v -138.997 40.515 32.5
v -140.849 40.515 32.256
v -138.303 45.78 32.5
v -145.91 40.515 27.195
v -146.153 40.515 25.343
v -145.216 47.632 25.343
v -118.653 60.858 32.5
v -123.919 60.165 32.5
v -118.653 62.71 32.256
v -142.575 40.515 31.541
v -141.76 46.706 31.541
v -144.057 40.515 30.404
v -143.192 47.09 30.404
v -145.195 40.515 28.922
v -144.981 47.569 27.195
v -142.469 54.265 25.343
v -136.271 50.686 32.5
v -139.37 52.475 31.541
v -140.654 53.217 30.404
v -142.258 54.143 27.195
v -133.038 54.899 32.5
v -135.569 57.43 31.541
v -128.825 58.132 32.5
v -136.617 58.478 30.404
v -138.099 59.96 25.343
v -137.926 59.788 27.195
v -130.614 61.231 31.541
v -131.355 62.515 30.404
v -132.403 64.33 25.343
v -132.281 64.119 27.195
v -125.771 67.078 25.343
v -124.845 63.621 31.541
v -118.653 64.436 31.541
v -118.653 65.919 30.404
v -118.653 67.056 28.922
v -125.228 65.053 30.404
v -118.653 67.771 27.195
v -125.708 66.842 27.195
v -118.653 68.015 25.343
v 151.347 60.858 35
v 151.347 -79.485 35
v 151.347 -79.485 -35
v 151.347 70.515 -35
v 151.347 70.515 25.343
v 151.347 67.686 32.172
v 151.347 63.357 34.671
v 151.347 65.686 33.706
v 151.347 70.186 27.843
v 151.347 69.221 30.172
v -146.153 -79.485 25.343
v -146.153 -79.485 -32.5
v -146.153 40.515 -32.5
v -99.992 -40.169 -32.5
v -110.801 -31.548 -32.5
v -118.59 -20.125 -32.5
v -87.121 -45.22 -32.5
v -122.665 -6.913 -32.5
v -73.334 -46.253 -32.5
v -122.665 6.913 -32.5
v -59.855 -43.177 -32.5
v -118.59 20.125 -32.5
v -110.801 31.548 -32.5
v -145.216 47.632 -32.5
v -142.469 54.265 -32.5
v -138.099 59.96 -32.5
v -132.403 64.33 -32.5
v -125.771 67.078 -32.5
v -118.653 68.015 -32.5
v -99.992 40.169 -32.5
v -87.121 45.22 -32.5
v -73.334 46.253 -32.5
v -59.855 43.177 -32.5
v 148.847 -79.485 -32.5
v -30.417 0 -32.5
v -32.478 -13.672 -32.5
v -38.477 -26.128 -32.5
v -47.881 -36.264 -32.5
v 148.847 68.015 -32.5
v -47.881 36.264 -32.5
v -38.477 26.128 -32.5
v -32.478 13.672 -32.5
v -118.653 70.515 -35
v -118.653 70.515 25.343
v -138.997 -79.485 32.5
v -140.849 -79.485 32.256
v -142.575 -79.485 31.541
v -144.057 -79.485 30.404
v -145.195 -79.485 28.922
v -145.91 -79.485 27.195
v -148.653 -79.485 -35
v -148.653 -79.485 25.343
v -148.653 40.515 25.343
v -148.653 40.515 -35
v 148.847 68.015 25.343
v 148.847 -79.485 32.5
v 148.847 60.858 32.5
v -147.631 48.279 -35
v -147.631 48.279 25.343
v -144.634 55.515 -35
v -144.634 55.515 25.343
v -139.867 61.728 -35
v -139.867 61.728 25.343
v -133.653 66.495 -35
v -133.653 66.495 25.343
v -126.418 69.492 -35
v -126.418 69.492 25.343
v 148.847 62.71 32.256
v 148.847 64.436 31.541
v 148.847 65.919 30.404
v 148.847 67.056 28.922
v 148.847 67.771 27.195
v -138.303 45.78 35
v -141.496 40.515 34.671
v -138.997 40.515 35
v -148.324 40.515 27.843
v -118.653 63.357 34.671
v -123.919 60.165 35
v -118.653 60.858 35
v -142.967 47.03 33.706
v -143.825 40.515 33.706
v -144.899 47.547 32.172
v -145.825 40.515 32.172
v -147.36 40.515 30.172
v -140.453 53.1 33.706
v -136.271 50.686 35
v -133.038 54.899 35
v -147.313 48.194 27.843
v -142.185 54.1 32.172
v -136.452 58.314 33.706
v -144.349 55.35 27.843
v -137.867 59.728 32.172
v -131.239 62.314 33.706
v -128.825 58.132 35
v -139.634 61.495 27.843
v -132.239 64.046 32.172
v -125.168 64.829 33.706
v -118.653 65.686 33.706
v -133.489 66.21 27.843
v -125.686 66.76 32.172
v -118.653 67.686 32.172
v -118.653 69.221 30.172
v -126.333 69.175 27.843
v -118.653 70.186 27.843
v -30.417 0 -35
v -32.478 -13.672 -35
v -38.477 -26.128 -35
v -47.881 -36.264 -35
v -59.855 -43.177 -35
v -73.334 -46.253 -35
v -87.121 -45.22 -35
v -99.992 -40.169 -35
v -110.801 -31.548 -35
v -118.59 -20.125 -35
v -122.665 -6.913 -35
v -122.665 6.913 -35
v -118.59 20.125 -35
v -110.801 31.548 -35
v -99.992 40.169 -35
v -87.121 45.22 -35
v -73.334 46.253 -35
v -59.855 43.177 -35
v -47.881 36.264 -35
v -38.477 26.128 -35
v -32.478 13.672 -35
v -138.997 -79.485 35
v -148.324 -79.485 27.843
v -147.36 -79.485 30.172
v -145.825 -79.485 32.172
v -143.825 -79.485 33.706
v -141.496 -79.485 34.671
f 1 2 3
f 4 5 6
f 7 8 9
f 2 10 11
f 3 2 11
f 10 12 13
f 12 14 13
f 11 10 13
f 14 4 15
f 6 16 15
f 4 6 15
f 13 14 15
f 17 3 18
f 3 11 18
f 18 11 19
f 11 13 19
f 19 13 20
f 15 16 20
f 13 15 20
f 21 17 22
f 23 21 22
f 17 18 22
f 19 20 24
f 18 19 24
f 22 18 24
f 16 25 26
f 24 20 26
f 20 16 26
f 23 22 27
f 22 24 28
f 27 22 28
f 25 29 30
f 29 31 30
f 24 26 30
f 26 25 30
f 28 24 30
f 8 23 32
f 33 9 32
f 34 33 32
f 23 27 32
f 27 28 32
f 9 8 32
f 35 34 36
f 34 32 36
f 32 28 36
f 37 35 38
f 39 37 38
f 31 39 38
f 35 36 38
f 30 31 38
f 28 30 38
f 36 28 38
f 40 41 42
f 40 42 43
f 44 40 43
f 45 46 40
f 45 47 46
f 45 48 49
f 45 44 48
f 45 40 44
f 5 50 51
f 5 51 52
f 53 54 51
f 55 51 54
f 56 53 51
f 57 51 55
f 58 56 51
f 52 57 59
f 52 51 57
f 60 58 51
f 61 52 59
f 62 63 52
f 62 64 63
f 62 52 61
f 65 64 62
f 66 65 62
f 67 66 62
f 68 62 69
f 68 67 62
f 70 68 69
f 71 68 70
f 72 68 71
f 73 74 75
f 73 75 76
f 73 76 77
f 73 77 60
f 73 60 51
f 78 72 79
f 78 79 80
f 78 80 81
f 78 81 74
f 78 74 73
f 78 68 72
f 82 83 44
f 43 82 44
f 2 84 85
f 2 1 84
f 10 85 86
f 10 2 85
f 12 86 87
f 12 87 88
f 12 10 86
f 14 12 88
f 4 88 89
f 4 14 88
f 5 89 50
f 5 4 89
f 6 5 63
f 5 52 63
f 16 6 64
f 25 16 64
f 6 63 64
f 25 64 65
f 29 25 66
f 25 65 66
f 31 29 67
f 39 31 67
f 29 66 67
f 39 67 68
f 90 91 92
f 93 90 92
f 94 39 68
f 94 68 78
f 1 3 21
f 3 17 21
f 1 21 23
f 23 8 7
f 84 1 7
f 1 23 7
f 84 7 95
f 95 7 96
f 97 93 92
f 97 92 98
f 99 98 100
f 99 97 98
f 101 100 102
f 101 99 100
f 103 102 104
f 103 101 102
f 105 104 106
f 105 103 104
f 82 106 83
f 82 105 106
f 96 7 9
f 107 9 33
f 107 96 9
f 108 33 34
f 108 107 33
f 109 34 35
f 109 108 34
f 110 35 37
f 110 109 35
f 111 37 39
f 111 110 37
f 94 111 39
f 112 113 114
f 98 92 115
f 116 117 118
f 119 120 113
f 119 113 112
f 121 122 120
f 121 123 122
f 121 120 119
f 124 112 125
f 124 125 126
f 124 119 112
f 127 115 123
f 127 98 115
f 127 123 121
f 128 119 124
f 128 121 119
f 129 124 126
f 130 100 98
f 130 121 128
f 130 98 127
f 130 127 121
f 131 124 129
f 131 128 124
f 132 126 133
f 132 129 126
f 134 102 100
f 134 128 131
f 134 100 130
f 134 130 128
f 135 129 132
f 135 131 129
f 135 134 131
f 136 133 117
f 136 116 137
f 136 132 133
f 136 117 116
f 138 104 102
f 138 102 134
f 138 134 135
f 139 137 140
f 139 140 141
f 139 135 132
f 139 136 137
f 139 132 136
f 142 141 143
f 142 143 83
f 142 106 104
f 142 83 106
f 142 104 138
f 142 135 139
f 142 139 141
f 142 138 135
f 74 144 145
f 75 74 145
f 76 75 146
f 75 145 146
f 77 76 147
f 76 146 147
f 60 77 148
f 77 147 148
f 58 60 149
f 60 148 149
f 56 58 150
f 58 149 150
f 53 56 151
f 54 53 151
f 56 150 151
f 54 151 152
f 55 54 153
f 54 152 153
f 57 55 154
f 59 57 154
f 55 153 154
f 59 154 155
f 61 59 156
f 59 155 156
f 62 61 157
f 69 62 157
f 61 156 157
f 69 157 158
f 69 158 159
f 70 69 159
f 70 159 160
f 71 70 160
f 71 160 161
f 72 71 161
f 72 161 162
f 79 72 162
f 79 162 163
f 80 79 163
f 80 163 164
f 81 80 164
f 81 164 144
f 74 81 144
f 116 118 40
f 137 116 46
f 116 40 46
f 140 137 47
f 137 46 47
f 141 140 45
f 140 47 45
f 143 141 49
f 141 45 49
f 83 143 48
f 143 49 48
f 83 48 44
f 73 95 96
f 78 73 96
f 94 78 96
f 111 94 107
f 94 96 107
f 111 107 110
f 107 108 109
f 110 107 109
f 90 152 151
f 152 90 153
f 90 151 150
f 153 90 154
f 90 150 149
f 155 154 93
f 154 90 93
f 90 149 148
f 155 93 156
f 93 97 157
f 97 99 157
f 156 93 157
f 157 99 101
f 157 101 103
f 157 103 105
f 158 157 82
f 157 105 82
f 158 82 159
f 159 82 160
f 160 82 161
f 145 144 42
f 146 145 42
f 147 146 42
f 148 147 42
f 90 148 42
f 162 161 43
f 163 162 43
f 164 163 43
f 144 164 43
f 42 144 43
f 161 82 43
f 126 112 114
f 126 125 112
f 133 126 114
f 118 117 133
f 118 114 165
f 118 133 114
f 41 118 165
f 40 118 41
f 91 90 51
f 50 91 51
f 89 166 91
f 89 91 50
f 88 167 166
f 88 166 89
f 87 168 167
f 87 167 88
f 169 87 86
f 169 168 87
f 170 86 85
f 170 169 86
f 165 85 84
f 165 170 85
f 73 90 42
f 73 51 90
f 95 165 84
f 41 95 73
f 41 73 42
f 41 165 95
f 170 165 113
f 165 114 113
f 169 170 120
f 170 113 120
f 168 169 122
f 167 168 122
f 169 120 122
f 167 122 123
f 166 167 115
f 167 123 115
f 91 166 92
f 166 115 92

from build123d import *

# Parameters (mm, degrees)
F0_W     = 300
F0_H     = 150
F1_DEPTH = 35
F2_R     = 30
F3_R     = 9.6568542495
F4_T     = -2.5
F5_R     = 46.3829958517
F6_DEPTH = 14


with BuildPart() as f1:
    # F0 (on Top) → F1 (new body, symmetric)
    with BuildSketch(Plane.XY):
        with Locations((1.3466058194, -4.4853053987)):
            Rectangle(F0_W, F0_H)
    extrude(amount=F1_DEPTH, both=True)

    # F2
    f2_edges = [f1.edges().sort_by_distance(p)[0] for p in [
        (-148.653394, 70.514695, 0),
    ]]
    fillet(f2_edges, radius=F2_R)

    # F3
    f3_edges = [f1.edges().sort_by_distance(p)[0] for p in [
        (16.346606, 70.514695, 35),
    ]]
    fillet(f3_edges, radius=F3_R)

    # F4
    f4_openings = [f1.faces().sort_by_distance(p)[0] for p in [
        (1.487632, -79.485305, -0.031329),
    ]]
    offset(amount=F4_T, openings=f4_openings)

    # F5 (on face) → F6 (cut)
    with BuildSketch(Plane(origin=(0, 0, -35), x_dir=(1, 0, 0), z_dir=(0, 0, -1))):
        with Locations((-76.8001675606, 0)):
            Circle(F5_R)
    extrude(amount=-F6_DEPTH, mode=Mode.SUBTRACT)


solid = f1.part
